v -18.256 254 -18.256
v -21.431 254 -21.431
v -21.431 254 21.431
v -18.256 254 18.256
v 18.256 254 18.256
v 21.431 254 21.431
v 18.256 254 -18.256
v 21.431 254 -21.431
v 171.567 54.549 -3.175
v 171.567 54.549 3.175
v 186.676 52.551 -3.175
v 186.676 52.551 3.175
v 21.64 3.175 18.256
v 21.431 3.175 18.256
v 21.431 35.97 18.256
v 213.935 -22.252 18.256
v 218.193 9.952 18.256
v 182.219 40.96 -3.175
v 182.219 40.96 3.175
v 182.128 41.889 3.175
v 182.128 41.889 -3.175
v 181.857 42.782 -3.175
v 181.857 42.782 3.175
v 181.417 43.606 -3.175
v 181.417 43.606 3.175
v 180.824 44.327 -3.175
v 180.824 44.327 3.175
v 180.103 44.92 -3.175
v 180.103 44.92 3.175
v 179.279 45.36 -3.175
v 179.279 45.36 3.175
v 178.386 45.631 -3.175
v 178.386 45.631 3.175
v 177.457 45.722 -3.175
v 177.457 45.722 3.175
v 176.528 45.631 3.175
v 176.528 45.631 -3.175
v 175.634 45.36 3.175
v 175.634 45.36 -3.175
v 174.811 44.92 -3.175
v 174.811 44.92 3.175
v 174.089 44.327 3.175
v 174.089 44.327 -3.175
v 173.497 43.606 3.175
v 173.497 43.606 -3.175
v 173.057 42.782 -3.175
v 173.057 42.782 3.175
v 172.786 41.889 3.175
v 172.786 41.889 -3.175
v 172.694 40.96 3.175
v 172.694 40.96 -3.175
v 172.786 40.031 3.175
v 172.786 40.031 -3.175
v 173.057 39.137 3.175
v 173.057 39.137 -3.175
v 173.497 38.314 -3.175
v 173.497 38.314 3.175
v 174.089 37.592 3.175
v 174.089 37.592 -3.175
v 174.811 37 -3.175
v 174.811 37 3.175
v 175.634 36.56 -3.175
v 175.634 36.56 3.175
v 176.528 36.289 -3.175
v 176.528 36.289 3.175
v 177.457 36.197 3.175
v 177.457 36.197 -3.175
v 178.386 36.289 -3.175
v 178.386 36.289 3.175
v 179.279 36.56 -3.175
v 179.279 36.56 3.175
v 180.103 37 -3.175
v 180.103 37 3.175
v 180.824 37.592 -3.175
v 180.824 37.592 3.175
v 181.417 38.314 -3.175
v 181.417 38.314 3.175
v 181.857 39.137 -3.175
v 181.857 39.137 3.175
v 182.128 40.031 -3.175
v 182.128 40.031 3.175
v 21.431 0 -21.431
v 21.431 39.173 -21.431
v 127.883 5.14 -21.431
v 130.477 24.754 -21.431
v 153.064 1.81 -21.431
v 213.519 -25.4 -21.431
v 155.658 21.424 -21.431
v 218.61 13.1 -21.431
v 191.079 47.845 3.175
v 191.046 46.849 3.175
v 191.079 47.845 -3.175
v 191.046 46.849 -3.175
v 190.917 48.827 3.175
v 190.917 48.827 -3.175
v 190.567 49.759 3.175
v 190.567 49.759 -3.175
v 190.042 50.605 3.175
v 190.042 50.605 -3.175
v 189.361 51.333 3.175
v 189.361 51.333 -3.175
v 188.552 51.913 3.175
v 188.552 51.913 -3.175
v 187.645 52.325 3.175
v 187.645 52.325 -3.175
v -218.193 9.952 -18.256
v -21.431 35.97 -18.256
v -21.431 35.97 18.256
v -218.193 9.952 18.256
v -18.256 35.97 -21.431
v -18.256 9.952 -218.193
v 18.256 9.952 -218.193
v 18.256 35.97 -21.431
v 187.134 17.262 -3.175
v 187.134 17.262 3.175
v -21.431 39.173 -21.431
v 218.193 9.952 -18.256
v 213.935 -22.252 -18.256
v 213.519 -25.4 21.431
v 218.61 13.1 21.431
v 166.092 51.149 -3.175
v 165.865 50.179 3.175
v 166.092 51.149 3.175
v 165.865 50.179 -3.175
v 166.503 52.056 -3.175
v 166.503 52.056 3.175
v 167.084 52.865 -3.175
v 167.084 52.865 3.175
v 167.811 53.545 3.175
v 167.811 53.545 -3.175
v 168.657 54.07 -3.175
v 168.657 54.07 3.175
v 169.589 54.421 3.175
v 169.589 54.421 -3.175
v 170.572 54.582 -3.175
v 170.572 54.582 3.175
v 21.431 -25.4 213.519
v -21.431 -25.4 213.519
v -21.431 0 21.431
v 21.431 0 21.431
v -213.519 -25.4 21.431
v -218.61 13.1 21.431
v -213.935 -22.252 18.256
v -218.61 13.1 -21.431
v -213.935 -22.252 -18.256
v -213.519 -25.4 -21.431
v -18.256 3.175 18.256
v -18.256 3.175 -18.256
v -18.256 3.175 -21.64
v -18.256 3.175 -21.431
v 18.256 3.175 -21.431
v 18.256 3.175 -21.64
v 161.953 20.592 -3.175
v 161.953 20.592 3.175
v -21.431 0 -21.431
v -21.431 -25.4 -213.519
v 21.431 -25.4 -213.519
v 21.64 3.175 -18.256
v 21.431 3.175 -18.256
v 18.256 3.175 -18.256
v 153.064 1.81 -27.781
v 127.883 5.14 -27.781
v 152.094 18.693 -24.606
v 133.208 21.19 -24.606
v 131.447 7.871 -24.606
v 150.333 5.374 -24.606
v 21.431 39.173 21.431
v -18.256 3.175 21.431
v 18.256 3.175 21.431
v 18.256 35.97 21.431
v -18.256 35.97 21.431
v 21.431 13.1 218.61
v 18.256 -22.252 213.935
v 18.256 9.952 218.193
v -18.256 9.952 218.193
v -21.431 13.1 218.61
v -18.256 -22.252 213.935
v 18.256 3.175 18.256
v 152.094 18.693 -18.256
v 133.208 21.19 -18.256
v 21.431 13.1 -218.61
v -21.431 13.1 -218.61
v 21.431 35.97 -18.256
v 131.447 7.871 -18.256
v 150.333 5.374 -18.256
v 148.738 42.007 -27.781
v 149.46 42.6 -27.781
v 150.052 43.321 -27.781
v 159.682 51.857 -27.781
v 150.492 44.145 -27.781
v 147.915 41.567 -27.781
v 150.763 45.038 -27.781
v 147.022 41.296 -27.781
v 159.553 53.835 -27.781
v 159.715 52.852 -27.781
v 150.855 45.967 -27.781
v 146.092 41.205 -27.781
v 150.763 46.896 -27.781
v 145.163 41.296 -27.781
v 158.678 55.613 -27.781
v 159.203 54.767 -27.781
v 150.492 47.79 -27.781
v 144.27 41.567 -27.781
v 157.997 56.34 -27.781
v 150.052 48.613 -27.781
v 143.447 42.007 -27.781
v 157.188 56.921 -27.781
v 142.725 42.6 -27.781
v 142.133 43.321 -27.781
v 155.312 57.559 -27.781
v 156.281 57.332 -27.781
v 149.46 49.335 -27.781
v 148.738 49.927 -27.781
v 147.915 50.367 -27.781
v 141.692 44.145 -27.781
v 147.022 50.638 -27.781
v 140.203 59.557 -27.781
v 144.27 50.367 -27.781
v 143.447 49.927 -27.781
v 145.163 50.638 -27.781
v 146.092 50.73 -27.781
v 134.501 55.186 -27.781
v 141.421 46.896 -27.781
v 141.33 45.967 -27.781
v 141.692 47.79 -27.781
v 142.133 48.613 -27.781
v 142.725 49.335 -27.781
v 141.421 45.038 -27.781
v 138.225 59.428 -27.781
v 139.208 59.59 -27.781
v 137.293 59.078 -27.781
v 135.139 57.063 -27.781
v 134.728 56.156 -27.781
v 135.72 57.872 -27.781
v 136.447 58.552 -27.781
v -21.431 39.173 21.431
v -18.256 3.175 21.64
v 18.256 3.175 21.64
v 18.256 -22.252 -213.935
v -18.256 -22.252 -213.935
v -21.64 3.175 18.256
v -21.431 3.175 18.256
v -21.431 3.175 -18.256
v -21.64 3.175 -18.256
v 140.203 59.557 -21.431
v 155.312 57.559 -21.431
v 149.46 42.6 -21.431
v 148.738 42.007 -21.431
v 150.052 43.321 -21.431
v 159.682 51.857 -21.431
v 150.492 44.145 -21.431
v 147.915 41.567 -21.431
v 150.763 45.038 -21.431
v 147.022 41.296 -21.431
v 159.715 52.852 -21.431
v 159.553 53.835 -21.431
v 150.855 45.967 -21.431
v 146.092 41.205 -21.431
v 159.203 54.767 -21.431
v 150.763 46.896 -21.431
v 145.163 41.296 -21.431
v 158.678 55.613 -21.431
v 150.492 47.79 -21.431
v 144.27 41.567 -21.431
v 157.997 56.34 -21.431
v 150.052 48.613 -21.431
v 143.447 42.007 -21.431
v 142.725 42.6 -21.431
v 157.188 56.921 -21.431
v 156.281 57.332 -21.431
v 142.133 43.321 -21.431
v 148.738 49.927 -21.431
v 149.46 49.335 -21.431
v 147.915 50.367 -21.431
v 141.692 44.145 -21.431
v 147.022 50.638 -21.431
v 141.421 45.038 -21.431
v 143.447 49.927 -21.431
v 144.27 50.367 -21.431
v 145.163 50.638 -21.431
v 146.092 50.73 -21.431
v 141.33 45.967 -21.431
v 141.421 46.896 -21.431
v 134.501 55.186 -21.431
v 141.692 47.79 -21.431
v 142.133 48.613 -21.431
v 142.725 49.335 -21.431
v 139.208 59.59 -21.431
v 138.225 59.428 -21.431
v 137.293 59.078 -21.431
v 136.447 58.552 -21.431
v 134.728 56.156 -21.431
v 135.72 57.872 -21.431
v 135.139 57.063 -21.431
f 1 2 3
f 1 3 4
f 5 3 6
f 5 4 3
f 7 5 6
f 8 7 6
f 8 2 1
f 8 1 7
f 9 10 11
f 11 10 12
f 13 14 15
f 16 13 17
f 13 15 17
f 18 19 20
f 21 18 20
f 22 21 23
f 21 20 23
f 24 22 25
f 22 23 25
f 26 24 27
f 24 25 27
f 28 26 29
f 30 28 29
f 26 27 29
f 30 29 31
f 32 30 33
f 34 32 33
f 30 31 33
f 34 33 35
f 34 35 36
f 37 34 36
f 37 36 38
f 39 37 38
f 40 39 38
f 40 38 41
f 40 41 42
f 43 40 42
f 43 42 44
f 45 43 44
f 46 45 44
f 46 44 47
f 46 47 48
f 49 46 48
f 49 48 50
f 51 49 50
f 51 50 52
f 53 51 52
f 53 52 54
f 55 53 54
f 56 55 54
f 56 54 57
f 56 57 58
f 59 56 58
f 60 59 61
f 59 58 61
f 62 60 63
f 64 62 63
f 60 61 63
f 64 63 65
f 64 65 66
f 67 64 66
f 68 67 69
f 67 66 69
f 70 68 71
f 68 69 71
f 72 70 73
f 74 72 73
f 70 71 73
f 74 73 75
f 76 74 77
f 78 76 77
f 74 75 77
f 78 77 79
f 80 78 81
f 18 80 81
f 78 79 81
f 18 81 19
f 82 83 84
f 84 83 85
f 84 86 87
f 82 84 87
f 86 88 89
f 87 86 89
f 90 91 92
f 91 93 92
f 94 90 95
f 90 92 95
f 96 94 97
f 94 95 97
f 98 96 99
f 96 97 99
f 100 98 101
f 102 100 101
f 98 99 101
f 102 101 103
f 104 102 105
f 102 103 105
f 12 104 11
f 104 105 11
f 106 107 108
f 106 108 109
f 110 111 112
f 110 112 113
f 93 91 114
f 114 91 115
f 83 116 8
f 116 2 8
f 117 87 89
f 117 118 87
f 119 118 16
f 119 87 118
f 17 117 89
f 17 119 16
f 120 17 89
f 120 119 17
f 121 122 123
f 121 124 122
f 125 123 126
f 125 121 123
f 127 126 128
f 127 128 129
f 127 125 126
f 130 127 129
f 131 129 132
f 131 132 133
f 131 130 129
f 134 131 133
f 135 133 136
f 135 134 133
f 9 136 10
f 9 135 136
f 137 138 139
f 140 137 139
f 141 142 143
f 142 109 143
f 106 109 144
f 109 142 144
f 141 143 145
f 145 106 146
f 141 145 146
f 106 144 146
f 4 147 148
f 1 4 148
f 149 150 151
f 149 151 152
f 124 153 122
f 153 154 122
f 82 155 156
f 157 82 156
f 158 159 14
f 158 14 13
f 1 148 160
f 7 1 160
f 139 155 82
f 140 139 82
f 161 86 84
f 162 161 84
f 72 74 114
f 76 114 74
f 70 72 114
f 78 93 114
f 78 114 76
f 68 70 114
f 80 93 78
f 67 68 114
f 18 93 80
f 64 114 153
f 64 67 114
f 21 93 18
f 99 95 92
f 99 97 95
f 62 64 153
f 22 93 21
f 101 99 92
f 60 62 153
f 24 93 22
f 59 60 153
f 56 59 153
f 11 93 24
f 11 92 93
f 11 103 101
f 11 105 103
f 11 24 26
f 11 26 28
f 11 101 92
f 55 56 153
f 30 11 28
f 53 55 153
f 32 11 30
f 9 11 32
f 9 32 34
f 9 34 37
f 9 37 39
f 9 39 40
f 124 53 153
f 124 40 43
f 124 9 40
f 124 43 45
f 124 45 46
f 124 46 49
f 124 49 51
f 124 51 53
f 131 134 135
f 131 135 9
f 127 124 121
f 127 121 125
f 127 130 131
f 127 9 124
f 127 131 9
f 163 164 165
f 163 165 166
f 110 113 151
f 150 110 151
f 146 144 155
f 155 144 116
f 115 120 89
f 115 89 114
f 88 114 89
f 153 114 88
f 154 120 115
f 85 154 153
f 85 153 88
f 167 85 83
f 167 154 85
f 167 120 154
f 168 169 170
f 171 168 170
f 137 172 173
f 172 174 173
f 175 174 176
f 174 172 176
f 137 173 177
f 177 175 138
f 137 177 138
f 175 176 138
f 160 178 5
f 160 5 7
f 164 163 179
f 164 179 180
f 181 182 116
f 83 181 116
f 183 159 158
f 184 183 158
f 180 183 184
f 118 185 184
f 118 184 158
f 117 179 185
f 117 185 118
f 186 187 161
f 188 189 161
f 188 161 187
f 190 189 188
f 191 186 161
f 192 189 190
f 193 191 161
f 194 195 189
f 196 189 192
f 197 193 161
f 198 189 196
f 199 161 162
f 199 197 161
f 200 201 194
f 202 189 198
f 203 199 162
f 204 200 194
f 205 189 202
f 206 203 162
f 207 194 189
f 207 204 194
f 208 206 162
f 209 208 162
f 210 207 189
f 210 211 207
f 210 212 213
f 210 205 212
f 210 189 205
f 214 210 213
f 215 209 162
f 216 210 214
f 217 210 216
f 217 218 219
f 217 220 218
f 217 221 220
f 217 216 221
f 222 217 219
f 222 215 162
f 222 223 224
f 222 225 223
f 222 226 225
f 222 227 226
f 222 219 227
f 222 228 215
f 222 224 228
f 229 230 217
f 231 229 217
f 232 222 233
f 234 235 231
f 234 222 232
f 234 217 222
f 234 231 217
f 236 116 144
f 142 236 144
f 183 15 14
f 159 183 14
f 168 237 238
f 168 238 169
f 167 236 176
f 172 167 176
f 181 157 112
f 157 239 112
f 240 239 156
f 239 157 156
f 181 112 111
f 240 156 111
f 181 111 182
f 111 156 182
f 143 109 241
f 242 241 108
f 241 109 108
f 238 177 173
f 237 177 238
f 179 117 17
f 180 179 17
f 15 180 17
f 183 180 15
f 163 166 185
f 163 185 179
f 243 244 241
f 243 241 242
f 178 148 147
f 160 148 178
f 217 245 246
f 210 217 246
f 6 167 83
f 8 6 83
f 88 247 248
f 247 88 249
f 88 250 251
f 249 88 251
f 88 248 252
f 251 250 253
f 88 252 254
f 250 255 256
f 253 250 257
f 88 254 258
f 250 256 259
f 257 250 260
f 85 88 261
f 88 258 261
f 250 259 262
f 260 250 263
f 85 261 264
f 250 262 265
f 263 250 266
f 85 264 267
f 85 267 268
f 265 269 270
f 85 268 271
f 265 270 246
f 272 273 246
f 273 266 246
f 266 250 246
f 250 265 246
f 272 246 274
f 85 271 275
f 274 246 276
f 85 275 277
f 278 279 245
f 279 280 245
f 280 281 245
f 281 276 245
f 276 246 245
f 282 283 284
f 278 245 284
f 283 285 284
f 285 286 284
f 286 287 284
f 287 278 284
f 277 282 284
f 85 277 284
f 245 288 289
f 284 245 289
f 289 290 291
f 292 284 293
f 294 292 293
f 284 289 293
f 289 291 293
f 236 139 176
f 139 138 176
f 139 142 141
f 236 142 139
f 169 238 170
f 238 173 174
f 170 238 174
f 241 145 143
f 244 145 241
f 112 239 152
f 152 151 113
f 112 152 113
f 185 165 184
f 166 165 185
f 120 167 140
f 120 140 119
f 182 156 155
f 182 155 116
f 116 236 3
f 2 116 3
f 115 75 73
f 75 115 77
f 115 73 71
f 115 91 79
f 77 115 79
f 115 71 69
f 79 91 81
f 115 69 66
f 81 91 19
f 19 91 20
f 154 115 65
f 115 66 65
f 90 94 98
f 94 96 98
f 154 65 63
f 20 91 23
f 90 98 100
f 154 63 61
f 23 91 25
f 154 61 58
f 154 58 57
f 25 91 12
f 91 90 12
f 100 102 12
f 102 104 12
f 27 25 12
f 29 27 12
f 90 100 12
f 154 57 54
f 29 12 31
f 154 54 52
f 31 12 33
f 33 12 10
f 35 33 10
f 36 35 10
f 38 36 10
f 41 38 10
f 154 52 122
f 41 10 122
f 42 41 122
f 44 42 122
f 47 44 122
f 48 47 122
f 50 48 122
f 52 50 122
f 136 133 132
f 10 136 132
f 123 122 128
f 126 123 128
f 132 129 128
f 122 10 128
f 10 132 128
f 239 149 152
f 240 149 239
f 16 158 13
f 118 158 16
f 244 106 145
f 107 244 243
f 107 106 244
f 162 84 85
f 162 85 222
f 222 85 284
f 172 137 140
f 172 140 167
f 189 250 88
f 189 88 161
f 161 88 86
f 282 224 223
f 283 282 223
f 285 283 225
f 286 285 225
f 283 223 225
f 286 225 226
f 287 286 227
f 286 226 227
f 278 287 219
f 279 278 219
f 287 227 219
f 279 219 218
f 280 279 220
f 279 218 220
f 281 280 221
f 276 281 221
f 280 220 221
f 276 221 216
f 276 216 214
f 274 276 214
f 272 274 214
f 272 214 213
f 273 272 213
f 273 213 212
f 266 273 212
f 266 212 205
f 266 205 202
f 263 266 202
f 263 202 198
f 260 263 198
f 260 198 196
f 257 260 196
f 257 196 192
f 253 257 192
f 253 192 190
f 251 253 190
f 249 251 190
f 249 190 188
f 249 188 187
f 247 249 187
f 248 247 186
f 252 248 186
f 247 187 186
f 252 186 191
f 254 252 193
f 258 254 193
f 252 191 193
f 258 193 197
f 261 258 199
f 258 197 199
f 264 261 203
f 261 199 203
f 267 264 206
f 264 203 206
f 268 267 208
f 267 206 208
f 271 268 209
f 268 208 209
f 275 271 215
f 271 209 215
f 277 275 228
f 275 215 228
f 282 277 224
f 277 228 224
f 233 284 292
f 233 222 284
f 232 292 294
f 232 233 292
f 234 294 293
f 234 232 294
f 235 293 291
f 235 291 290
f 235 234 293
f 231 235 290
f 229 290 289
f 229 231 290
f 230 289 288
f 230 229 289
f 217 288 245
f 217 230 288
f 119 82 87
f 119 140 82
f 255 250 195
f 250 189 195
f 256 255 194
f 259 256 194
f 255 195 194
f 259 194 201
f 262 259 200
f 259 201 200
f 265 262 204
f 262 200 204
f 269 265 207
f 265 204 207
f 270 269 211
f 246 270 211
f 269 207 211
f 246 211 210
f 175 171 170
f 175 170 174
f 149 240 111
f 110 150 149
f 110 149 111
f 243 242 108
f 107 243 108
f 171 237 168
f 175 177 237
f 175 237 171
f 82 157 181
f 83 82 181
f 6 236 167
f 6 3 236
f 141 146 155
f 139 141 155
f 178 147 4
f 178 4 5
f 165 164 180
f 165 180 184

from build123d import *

# Parameters (mm, degrees)
SKETCH1_W           = 42.8625
SKETCH1_H           = 42.8625
BOSS_EXTRUDE1_DEPTH = 254
SHELL1_T            = -3.175
BOSS_EXTRUDE2_DEPTH = 21.43125
CIRPATTERN1_START   = -21.43125
CIRPATTERN1_DEPTH   = 42.8625
CIRPATTERN1_2_DEPTH = 42.8625
BOSS_EXTRUDE3_DEPTH = 6.35
SKETCH4_R           = 4.7625
CUT_EXTRUDE1_DEPTH  = 416.95027213
BOSS_EXTRUDE4_DEPTH = 3.175
SKETCH6_R           = 4.7625
CUT_EXTRUDE2_DEPTH  = 402.863889424
FILLET1_R           = 5.08
SHELL3_START        = -18.25625
SHELL3_DEPTH        = 36.5125
SHELL3_2_DEPTH      = 36.5125
SHELL3_START_2      = -24.60625
SHELL3_3_DEPTH      = 6.35


with BuildPart() as part:
    # Sketch1 → Boss-Extrude1 (new body)
    with BuildSketch(Plane(origin=(0, 0, 0), x_dir=(1, 0, 0), z_dir=(0, 1, 0))):
        Rectangle(SKETCH1_W, SKETCH1_H)
    extrude(amount=BOSS_EXTRUDE1_DEPTH)

    # Shell1
    shell1_openings = [part.faces().sort_by_distance(p)[0] for p in [
        (0, 254, 0),
    ]]
    offset(amount=SHELL1_T, openings=shell1_openings, kind=Kind.INTERSECTION)

    # Sketch2 → Boss-Extrude2 (add, symmetric)
    with BuildSketch(Plane.XY):
        Polygon((21.43125, 0), (213.51875, -25.4), (218.609622268, 13.099721526), (21.43125, 39.172894719), align=None)
    extrude(amount=BOSS_EXTRUDE2_DEPTH, both=True)

    # CirPattern1: read off the stored shape, not the designer's step
    # CirPattern1 outline → CirPattern1 (add)
    with BuildSketch(Plane.YZ.offset(CIRPATTERN1_START)):
        Polygon((13.099721526, -218.609622268), (39.172894719, -21.43125), (0, -21.43125), (-25.4, -213.51875), align=None)
        Polygon((-25.4, 213.51875), (0, 21.43125), (39.172894719, 21.43125), (13.099721526, 218.609622268), align=None)
    extrude(amount=CIRPATTERN1_DEPTH)

    # CirPattern1 2 outline → CirPattern1 2 (add)
    with BuildSketch(Plane.XY.offset(CIRPATTERN1_START)):
        Polygon((-213.51875, -25.4), (-21.43125, 0), (-21.43125, 39.172894719), (-218.609622268, 13.099721526), align=None)
    extrude(amount=CIRPATTERN1_2_DEPTH)

    # Sketch3 → Boss-Extrude3 (add)
    with BuildSketch(Plane(origin=(0, 0, -21.43125), x_dir=(-1, 0, 0), z_dir=(0, 0, -1))):
        Polygon((-153.063997925, 1.80984108), (-127.883188972, 5.139534826), (-135.166894041, 60.222554412), (-160.347702995, 56.892860666), align=None)
    extrude(amount=BOSS_EXTRUDE3_DEPTH)

    # Sketch4 → Cut-Extrude1 (cut, through all)
    with BuildSketch(Plane(origin=(0, 0, -27.78125), x_dir=(-1, 0, 0), z_dir=(0, 0, -1))):
        with Locations((-146.092451645, 45.967303062)):
            Circle(SKETCH4_R)
    extrude(amount=-CUT_EXTRUDE1_DEPTH, mode=Mode.SUBTRACT)

    # Sketch5 → Boss-Extrude4 (add, symmetric)
    with BuildSketch(Plane.XY):
        Polygon((161.952802122, 20.591532454), (166.531131023, 55.215144766), (191.711939977, 51.88545102), (187.133611076, 17.261838709), align=None)
    extrude(amount=BOSS_EXTRUDE4_DEPTH, both=True)

    # Sketch6 → Cut-Extrude2 (cut, through all)
    with BuildSketch(Plane.XY.offset(3.175)):
        with Locations((177.456688627, 40.959893416)):
            Circle(SKETCH6_R)
    extrude(amount=-CUT_EXTRUDE2_DEPTH, mode=Mode.SUBTRACT)

    # Fillet1
    fillet1_edges = [part.edges().sort_by_distance(p)[0] for p in [
        (160.347702995, 56.892860666, -24.60625),
        (135.166894041, 60.222554412, -24.60625),
        (191.711939977, 51.88545102, 0),
        (166.531131023, 55.215144766, 0),
    ]]
    fillet(fillet1_edges, radius=FILLET1_R)

    # Shell3: read off the stored shape, not the designer's step
    # Shell3 outline → Shell3 (cut)
    with BuildSketch(Plane.YZ.offset(SHELL3_START)):
        Polygon((9.952120407, -218.19341055), (35.970257339, -21.43125), (3.175, -21.43125), (3.175, -21.640257682), (-22.252398881, -213.934961718), align=None)
        Polygon((3.175, 21.640257682), (3.175, 21.43125), (35.970257339, 21.43125), (9.952120407, 218.19341055), (-22.252398881, 213.934961718), align=None)
    extrude(amount=SHELL3_DEPTH, mode=Mode.SUBTRACT)

    # Shell3 2 outline → Shell3 2 (cut)
    with BuildSketch(Plane.XY.offset(SHELL3_START)):
        Polygon((-21.640257682, 3.175), (-21.43125, 3.175), (-21.43125, 35.970257339), (-218.19341055, 9.952120407), (-213.934961718, -22.252398881), align=None)
        Polygon((21.43125, 35.970257339), (21.43125, 3.175), (21.640257682, 3.175), (213.934961718, -22.252398881), (218.19341055, 9.952120407), align=None)
    extrude(amount=SHELL3_2_DEPTH, mode=Mode.SUBTRACT)

    # Shell3 3 outline → Shell3 3 (cut)
    with BuildSketch(Plane.XY.offset(SHELL3_START_2)):
        Polygon((152.093787046, 18.69256649), (133.208180331, 21.189836799), (131.447001809, 7.870924227), (150.332608524, 5.373653917), align=None)
    extrude(amount=SHELL3_3_DEPTH, mode=Mode.SUBTRACT)


solid = part.part
